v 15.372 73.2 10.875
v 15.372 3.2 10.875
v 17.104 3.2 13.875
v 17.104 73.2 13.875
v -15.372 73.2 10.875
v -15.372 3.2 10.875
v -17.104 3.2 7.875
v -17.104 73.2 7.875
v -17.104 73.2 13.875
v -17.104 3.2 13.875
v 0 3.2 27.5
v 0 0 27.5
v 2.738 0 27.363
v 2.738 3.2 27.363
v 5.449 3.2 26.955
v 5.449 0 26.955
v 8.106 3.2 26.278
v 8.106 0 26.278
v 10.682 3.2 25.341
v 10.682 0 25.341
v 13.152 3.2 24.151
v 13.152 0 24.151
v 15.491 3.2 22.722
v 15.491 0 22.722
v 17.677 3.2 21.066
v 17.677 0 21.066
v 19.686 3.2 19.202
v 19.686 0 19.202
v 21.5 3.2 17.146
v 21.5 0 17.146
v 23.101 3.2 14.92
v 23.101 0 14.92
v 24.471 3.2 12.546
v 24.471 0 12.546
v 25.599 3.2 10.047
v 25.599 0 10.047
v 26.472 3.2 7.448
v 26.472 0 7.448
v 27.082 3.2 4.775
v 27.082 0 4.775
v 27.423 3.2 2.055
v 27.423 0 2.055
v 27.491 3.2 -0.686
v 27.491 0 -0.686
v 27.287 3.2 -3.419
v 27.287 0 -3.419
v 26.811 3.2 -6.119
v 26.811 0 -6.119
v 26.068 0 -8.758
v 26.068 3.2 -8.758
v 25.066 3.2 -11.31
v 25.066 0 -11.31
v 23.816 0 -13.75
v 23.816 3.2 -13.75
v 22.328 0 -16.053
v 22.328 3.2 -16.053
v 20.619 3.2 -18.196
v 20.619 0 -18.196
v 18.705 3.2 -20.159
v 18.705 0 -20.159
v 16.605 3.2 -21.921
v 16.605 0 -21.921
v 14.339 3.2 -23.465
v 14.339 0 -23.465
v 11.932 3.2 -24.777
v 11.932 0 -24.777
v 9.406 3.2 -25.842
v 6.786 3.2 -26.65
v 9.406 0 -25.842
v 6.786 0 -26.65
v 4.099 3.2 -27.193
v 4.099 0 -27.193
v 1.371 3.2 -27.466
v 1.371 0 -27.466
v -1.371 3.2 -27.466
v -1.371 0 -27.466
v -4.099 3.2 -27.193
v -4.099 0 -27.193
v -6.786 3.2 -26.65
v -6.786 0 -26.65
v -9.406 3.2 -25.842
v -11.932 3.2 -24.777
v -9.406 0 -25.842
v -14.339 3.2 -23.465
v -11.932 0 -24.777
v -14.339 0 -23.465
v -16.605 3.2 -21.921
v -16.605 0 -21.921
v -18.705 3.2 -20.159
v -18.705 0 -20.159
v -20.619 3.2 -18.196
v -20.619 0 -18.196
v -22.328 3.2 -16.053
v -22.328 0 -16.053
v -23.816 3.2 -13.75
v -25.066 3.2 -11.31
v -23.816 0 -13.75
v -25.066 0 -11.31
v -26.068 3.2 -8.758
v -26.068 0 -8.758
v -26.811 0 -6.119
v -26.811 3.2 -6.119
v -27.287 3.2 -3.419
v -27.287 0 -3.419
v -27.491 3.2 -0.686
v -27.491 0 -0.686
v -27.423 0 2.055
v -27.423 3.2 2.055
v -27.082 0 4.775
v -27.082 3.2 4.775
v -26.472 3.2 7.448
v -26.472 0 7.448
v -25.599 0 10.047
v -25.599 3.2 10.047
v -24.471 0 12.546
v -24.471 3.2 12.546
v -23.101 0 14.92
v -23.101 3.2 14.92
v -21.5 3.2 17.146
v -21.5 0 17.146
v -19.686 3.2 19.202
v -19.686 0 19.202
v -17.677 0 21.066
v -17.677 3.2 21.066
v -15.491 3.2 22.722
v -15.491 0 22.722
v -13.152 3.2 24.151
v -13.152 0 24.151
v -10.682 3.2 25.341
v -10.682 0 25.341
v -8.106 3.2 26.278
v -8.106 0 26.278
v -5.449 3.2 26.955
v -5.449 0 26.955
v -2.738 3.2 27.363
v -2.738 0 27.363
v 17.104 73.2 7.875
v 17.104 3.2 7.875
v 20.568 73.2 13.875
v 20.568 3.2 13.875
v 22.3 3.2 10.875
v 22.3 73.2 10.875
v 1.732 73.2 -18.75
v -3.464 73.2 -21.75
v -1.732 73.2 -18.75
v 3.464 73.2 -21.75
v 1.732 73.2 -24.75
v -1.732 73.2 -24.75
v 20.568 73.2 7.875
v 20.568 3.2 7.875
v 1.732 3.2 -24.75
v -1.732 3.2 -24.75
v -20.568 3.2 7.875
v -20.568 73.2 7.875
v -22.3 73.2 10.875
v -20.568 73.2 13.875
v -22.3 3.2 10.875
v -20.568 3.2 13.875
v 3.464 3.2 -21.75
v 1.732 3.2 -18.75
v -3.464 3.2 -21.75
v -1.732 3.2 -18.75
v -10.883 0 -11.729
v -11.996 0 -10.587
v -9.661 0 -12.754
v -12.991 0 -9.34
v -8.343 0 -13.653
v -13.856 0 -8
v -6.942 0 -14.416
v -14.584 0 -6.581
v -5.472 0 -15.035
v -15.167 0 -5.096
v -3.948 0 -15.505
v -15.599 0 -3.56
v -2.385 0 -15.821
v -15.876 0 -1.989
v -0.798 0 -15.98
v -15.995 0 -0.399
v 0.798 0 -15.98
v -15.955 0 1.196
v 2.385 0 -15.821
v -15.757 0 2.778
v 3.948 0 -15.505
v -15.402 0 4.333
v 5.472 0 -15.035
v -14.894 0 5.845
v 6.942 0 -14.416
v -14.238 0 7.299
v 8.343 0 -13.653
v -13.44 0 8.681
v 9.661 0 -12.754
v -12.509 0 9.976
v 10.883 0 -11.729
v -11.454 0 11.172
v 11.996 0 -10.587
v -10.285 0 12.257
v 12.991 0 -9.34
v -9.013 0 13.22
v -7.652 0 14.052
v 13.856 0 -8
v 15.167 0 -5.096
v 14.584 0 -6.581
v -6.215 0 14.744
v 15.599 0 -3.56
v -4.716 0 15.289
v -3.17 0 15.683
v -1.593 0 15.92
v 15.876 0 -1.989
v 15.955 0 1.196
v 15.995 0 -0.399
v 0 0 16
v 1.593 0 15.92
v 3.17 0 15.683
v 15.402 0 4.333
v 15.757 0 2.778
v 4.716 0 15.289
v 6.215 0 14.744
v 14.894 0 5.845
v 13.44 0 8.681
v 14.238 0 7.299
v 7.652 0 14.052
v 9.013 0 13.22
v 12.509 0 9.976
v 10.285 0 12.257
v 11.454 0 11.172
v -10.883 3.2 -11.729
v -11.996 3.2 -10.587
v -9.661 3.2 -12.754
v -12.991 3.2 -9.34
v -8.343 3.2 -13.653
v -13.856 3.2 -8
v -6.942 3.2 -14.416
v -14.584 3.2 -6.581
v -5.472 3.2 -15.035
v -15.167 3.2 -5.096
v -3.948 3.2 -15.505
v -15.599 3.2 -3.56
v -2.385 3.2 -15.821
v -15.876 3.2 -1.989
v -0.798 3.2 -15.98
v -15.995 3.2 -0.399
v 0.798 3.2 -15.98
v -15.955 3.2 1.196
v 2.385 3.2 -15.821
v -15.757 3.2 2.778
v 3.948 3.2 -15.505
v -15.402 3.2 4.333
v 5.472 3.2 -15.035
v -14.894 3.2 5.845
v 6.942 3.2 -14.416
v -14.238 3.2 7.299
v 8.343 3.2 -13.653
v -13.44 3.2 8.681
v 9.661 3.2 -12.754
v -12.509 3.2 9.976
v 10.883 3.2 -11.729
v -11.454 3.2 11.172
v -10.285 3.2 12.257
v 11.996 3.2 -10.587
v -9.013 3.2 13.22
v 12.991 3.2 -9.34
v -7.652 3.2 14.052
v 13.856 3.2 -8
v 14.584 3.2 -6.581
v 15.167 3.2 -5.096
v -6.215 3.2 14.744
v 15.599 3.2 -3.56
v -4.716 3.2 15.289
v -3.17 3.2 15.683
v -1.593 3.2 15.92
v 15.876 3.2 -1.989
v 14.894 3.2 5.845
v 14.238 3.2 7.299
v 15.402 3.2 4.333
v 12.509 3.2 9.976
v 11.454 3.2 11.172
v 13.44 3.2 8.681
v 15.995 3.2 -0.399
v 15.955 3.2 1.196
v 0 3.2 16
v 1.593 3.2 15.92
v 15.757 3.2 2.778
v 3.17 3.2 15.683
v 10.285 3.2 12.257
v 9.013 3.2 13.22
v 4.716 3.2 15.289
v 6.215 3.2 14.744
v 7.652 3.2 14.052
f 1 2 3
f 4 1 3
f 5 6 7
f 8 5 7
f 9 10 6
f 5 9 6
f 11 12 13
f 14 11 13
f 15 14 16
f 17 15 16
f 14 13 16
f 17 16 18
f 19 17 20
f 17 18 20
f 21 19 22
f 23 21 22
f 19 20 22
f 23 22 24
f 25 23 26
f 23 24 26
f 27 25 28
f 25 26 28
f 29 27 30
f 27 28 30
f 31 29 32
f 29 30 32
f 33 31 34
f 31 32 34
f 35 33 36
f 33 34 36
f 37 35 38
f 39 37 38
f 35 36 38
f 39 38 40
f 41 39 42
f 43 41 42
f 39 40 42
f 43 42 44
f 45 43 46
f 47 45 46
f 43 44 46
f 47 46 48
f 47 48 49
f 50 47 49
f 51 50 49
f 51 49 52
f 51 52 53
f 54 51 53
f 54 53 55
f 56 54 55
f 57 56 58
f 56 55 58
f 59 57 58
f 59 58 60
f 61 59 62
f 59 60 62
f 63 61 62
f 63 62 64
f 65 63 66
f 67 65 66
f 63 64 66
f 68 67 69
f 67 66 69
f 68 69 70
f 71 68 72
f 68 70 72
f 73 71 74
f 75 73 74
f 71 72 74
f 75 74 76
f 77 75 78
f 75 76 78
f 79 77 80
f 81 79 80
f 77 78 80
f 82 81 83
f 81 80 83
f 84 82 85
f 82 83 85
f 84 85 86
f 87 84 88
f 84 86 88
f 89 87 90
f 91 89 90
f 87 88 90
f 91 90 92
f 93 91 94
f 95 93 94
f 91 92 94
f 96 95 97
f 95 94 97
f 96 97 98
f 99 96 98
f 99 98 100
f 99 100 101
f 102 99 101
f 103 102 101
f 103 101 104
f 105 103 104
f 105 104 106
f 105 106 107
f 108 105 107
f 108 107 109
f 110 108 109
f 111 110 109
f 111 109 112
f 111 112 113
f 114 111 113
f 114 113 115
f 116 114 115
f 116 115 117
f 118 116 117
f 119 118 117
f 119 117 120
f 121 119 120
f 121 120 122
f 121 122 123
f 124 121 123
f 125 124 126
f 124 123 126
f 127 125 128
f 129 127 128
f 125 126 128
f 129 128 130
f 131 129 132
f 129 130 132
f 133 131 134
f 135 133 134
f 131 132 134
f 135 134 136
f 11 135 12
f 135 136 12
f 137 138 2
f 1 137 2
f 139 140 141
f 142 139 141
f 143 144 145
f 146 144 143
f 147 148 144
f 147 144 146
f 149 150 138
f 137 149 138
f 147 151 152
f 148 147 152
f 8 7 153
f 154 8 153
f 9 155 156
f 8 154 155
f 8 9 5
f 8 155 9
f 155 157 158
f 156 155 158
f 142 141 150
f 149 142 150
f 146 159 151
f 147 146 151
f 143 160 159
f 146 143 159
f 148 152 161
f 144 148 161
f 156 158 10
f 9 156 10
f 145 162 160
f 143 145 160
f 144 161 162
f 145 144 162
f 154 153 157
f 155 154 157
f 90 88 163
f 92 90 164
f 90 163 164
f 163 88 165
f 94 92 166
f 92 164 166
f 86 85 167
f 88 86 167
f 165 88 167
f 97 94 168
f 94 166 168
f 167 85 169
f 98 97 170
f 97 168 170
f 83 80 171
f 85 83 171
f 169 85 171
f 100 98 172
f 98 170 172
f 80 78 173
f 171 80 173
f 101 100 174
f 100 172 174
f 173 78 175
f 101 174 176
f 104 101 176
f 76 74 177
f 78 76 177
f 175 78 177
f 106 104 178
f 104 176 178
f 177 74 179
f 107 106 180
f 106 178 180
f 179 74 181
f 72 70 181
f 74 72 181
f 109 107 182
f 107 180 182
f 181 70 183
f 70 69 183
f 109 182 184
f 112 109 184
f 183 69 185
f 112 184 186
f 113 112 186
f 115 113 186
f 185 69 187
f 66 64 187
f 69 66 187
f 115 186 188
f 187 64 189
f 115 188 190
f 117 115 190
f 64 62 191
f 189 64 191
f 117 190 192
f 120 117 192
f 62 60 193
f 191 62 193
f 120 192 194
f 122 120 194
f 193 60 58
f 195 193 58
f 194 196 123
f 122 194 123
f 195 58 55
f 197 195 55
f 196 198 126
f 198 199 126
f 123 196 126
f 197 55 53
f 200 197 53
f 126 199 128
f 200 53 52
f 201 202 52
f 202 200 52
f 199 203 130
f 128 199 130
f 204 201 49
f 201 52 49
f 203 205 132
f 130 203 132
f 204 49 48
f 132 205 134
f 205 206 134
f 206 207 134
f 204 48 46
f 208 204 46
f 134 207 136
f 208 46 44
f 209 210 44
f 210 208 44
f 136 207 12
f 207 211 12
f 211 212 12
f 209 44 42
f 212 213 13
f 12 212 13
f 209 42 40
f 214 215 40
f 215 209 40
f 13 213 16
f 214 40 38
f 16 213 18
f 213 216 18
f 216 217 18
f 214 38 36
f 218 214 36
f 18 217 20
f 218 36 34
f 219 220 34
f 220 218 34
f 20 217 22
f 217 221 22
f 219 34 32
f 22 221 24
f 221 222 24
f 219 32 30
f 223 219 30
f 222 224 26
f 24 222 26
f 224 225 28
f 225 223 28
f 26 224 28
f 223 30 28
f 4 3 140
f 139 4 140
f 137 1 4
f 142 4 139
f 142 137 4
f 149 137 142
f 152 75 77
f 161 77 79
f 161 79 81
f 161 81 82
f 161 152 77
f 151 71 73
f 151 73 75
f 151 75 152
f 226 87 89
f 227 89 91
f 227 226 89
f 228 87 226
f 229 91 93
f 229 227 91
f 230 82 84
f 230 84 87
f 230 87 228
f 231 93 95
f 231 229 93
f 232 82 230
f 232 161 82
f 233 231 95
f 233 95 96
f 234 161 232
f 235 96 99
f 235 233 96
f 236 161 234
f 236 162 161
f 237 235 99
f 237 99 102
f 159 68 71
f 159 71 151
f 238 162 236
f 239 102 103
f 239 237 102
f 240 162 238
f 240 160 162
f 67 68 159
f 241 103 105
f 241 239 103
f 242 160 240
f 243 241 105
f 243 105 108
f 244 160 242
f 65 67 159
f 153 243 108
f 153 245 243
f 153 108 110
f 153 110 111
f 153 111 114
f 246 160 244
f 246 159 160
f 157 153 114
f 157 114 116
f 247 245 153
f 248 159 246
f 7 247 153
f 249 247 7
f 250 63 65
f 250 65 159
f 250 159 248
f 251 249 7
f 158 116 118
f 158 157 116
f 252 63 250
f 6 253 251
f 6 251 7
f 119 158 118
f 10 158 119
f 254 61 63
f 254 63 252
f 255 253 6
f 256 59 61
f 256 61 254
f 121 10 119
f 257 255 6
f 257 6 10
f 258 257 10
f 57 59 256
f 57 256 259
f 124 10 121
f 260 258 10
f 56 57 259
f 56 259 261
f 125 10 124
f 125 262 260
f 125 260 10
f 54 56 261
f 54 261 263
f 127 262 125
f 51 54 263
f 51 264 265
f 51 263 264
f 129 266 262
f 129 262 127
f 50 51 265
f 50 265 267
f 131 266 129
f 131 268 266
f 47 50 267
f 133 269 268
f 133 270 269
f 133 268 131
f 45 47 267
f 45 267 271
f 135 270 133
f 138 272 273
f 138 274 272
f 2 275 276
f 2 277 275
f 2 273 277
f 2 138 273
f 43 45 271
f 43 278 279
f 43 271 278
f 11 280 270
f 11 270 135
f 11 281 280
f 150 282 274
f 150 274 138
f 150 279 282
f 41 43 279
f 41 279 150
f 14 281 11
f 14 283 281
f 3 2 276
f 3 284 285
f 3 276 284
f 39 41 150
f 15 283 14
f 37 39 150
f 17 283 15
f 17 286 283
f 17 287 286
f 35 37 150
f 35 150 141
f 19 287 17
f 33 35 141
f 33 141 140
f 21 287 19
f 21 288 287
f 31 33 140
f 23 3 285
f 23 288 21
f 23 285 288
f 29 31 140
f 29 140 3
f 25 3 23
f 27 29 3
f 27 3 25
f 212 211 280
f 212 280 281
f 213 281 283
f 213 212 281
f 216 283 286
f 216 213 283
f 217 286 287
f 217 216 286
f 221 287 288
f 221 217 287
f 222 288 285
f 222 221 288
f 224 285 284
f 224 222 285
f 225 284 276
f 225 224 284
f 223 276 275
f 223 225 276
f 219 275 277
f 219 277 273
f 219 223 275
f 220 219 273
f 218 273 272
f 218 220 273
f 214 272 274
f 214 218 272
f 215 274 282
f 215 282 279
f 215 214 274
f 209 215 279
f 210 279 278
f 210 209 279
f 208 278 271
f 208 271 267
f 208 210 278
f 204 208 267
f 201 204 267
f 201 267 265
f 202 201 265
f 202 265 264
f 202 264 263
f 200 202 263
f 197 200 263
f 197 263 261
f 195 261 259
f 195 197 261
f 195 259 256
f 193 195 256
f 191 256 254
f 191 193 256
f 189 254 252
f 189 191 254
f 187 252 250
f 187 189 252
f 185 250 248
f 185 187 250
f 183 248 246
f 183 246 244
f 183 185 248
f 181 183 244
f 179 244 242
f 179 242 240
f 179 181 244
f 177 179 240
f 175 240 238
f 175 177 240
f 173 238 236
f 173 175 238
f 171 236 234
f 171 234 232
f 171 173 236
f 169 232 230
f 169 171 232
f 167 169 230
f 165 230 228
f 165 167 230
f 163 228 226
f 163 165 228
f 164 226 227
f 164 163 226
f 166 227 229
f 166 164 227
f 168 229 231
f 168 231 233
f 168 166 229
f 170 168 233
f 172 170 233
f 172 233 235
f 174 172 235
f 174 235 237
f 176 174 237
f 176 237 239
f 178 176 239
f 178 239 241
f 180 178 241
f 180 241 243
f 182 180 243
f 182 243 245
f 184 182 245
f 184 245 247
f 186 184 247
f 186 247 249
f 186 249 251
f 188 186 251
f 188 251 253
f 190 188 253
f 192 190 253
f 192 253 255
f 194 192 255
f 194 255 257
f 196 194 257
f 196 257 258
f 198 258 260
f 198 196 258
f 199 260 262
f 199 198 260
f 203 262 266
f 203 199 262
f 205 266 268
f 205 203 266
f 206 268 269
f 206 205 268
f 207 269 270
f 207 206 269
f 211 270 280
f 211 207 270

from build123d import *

# Parameters (mm, degrees)
SKETCH_1_R      = 27.5
SKETCH_1_R_2    = 16
EXTRUDE_1_DEPTH = 3.2
EXTRUDE_2_DEPTH = 70


with BuildPart() as part:
    # Эскиз1 → Бобышка-Вытянуть1 (new body)
    with BuildSketch(Plane(origin=(0, 0, 0), x_dir=(1, 0, 0), z_dir=(0, 1, 0))):
        with Locations(Location((0, 0, 0), (0, 0, 270))):
            Circle(SKETCH_1_R)
        with Locations(Location((0, 0, 0), (0, 0, 270))):
            Circle(SKETCH_1_R_2, mode=Mode.SUBTRACT)
    extrude(amount=EXTRUDE_1_DEPTH)

    # Эскиз2 → Бобышка-Вытянуть2 (add)
    with BuildSketch(Plane(origin=(0, 3.2, 0), x_dir=(1, 0, 0), z_dir=(0, 1, 0))):
        Polygon((17.104001725, -13.875), (20.56810334, -13.875), (22.300154147, -10.875), (20.56810334, -7.875), (17.104001725, -7.875), (15.371950917, -10.875), align=None)
        Polygon((3.464101615, 21.75), (1.732050808, 24.75), (-1.732050808, 24.75), (-3.464101615, 21.75), (-1.732050808, 18.75), (1.732050808, 18.75), align=None)
        Polygon((-20.56810334, -7.875), (-22.300154147, -10.875), (-20.56810334, -13.875), (-17.104001725, -13.875), (-15.371950917, -10.875), (-17.104001725, -7.875), align=None)
    extrude(amount=EXTRUDE_2_DEPTH)


solid = part.part
